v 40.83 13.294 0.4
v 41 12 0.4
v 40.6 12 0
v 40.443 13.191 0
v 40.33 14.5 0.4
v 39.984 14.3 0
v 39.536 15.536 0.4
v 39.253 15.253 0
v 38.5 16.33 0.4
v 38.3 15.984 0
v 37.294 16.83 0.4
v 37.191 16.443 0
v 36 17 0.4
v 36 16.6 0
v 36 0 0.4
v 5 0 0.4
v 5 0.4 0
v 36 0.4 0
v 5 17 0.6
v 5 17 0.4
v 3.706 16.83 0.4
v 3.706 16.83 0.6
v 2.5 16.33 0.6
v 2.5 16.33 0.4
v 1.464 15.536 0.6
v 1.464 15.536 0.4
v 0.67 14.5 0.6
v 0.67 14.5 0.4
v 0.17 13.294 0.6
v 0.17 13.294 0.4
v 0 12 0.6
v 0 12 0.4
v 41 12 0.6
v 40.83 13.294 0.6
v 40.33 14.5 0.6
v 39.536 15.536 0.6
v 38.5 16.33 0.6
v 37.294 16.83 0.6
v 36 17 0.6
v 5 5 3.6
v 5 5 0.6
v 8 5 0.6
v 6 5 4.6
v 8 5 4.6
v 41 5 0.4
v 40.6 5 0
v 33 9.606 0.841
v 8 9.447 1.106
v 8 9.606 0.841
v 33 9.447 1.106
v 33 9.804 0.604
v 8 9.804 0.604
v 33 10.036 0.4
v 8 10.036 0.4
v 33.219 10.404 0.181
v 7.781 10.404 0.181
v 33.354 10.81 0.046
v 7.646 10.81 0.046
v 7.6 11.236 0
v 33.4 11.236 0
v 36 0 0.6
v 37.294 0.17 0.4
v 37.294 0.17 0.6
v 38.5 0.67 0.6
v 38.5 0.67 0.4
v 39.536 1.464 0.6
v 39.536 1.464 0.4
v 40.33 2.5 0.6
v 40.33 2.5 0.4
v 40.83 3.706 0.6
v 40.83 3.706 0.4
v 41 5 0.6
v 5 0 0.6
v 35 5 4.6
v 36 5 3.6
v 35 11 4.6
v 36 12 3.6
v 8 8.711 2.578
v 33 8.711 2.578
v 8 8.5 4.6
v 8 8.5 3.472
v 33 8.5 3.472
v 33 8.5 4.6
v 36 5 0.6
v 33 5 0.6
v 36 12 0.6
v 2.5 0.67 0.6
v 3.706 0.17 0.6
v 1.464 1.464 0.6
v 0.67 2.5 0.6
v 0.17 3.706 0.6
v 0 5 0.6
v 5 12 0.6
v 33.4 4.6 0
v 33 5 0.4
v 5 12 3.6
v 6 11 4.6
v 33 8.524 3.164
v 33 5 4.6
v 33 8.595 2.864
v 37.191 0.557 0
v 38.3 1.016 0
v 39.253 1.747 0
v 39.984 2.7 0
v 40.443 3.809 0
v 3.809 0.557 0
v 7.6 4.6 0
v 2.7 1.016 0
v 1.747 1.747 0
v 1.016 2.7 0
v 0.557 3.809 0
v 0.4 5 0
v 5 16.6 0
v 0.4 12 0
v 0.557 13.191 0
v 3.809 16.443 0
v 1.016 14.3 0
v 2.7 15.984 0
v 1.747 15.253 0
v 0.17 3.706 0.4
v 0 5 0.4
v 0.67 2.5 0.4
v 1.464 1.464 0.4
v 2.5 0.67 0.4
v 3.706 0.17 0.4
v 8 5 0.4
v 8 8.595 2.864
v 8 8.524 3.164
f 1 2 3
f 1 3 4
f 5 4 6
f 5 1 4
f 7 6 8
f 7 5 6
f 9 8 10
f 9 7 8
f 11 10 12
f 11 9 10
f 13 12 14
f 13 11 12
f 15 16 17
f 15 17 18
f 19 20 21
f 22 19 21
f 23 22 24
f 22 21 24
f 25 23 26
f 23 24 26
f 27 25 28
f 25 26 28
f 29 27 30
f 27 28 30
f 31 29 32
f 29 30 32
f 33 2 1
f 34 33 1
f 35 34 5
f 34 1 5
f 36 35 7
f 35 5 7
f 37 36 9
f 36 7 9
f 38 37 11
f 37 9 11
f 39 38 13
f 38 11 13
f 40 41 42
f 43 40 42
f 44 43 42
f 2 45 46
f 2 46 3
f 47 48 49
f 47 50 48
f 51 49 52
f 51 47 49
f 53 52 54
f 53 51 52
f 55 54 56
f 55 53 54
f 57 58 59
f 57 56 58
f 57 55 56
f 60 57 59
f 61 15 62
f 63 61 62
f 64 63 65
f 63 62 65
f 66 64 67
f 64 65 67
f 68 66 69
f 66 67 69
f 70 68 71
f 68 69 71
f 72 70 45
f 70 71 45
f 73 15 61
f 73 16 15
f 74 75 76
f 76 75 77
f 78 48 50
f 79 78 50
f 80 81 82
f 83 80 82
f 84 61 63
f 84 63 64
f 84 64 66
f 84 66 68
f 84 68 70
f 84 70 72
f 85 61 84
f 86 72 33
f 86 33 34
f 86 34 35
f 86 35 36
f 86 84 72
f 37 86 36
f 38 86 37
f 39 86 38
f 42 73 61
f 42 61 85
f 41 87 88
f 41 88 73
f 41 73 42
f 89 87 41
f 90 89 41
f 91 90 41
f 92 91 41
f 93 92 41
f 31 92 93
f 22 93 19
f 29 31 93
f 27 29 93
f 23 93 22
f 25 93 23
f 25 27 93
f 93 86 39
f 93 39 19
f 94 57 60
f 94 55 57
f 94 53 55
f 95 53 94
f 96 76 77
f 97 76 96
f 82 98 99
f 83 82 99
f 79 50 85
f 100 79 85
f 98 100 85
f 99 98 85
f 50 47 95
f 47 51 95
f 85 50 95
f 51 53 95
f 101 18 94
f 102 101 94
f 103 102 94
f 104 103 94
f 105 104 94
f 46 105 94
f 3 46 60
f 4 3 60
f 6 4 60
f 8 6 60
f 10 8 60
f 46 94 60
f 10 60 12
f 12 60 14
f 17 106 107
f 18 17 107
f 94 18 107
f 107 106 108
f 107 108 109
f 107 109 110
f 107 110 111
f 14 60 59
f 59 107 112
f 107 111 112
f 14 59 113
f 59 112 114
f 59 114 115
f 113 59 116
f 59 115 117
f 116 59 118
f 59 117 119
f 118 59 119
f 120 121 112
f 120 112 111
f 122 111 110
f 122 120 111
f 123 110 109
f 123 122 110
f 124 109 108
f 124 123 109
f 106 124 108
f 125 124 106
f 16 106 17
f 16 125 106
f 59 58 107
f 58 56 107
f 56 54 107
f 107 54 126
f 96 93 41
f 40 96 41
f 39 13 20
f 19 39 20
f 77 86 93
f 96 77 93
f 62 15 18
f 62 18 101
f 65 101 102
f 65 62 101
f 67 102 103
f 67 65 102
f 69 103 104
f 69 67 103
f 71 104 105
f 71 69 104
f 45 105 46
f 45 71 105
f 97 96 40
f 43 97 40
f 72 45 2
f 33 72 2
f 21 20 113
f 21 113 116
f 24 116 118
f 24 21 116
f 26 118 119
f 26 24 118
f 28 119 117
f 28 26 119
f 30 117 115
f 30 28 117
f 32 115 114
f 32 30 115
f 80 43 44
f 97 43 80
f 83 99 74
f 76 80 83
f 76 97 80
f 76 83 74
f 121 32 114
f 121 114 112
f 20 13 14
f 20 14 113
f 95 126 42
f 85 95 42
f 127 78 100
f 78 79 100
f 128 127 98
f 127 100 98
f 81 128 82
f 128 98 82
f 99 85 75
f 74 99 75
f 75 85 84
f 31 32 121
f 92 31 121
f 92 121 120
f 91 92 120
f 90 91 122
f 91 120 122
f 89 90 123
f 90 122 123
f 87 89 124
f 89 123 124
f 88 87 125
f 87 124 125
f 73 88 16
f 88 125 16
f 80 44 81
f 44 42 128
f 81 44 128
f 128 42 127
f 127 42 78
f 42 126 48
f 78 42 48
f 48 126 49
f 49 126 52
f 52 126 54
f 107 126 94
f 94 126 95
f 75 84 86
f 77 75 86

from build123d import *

# Parameters (mm, degrees)
F1_DEPTH = 0.6
F3_DEPTH = 4
F4_SIZE  = 1
F5_SIZE2 = 1.5
F5_SIZE  = 3
F6_R     = 2
F7_W     = 5
F7_H     = 0.6
F8_DEPTH = 25
F9_SIZE  = 0.4


with BuildPart() as f1:
    # F0 (on Top) → F1 (new body)
    with BuildSketch(Plane.XY):
        with BuildLine():
            ThreePointArc((0, 5), (1.4644660941, 1.4644660941), (5, 0))
            Line((5, 0), (8, 0))
            Line((8, 0), (8, 8.5))
            Line((8, 8.5), (33, 8.5))
            Line((33, 8.5), (33, 0))
            Line((33, 0), (36, 0))
            ThreePointArc((36, 0), (39.5355339059, 1.4644660941), (41, 5))
            Line((41, 5), (41, 12))
            ThreePointArc((41, 12), (39.5355339059, 15.5355339059), (36, 17))
            Line((36, 17), (5, 17))
            ThreePointArc((5, 17), (1.4644660941, 15.5355339059), (0, 12))
            Line((0, 12), (0, 5))
        make_face()
    extrude(amount=F1_DEPTH)

    # F2 (on face) → F3 (join)
    with BuildSketch(Plane.XY.offset(0.6)):
        Polygon((36, 12), (5, 12), (5, 5), (8, 5), (8, 8.5), (33, 8.5), (33, 5), (36, 5), align=None)
    extrude(amount=F3_DEPTH)

    # F4
    f4_edges = [f1.edges().sort_by_distance(p)[0] for p in [
        (5, 8.5, 4.6),
        (20.5, 12, 4.6),
        (36, 8.5, 4.6),
    ]]
    chamfer(f4_edges, length=F4_SIZE)

    # F5
    f5_edges = [f1.edges().sort_by_distance(p)[0] for p in [
        (20.5, 8.5, 0),
    ]]
    f5_side = f1.faces().sort_by_distance((20.5, 8.5, 2.3))[0]
    chamfer(f5_edges, length=F5_SIZE, length2=F5_SIZE2, reference=f5_side)

    # F6
    f6_edges = [f1.edges().sort_by_distance(p)[0] for p in [
        (20.5, 10, 0),
        (20.5, 8.5, 3),
    ]]
    fillet(f6_edges, radius=F6_R)

    # F7 (on face) → F8 (join, through all)
    with BuildSketch(Plane.YZ.offset(8)):
        with Locations((2.5, 0.3)):
            Rectangle(F7_W, F7_H)
    extrude(amount=F8_DEPTH)

    # F9
    f9_edges = [f1.edges().sort_by_distance(p)[0] for p in [
        (20.5, 17, 0),
        (20.5, 5, 0),
        (8, 8.118034, 0),
        (41, 8.5, 0),
        (39.535534, 1.464466, 0),
        (20.5, 0, 0),
        (1.464466, 1.464466, 0),
        (0, 8.5, 0),
        (1.464466, 15.535534, 0),
        (39.535534, 15.535534, 0),
        (33, 8.118034, 0),
    ]]
    chamfer(f9_edges, length=F9_SIZE)


solid = f1.part
